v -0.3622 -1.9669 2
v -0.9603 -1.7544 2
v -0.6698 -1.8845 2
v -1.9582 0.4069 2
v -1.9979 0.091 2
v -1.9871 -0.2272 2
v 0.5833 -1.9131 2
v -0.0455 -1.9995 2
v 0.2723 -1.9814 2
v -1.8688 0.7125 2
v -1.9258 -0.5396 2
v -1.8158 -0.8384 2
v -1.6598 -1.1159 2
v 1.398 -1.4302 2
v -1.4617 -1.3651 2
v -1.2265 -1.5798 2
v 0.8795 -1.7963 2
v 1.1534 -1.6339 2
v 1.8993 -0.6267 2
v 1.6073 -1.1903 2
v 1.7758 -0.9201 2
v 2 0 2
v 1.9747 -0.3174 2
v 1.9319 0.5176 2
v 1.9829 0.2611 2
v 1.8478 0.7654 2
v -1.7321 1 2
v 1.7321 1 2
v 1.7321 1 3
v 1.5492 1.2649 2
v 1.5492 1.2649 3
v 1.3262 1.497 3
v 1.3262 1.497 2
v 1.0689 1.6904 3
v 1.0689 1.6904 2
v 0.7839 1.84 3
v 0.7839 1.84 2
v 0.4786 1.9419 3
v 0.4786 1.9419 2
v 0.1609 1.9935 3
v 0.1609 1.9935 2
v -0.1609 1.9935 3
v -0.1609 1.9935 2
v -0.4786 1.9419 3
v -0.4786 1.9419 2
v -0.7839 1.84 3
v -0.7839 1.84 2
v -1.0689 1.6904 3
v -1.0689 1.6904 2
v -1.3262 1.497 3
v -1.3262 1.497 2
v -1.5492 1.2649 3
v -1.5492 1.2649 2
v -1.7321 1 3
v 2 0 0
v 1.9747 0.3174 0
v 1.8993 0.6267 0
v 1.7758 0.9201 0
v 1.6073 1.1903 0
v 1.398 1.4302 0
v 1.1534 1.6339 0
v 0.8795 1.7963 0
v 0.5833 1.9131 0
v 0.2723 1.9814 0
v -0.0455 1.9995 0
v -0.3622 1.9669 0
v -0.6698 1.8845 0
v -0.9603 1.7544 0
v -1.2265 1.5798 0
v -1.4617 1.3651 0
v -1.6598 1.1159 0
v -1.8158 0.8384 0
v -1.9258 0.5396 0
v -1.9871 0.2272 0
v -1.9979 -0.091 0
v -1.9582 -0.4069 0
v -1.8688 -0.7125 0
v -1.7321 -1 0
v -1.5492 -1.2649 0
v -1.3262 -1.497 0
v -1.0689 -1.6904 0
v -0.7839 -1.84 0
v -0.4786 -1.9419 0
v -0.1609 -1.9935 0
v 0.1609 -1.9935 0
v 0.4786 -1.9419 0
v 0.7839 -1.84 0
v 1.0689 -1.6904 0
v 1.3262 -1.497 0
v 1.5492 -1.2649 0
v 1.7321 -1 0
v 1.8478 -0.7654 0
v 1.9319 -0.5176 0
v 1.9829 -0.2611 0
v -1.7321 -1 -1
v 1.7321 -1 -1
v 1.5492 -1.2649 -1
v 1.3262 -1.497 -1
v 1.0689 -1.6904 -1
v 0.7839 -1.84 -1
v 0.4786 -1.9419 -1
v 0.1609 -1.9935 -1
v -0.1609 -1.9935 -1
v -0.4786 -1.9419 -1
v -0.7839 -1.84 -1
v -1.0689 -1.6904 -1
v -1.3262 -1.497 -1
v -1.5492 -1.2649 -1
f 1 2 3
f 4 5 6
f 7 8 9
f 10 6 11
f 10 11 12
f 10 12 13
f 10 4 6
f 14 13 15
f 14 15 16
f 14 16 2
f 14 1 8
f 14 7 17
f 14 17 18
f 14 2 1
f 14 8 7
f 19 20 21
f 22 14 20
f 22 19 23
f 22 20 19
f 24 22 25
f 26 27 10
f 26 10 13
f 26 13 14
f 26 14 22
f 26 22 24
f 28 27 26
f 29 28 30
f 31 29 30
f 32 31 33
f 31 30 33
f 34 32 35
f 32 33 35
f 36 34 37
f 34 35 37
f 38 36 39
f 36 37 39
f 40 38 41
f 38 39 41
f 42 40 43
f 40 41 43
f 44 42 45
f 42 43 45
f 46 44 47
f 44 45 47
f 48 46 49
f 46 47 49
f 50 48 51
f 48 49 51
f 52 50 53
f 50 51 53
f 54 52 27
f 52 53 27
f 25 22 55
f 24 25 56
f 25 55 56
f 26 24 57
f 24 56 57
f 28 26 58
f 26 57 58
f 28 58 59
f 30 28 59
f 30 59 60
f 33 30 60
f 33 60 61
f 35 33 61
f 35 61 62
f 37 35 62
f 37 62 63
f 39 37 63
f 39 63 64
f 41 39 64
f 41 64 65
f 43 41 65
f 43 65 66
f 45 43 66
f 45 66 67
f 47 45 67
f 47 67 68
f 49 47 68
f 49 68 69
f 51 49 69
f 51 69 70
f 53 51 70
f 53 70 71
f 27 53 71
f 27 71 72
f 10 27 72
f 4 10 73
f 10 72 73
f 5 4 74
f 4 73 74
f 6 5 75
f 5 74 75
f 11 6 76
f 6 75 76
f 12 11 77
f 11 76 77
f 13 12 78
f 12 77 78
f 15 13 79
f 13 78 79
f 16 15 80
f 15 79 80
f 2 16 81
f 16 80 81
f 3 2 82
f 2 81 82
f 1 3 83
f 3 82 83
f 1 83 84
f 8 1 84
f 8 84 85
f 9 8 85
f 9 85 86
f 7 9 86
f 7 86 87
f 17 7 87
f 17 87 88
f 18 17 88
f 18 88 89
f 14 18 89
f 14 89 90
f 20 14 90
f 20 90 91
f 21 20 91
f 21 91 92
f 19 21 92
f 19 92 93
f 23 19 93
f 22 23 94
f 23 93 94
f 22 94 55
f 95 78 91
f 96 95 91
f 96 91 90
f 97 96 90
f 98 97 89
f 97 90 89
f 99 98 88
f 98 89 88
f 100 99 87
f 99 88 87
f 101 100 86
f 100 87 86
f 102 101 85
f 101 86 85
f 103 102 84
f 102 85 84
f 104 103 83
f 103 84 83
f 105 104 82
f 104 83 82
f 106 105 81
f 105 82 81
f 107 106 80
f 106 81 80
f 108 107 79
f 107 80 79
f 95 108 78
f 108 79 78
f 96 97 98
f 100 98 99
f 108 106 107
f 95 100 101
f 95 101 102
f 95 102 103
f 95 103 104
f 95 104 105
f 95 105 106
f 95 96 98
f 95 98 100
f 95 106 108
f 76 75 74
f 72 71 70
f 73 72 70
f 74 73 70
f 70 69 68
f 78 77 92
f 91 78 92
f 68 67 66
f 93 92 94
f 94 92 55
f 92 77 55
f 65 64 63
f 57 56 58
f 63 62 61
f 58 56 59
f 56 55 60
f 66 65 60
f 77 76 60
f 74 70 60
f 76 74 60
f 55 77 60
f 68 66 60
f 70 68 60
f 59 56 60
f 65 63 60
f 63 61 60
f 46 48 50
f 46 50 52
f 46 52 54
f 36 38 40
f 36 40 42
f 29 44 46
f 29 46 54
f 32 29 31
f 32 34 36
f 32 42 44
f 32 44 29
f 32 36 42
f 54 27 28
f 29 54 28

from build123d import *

# Parameters (mm, degrees)
SKETCH1_R           = 2
BOSS_EXTRUDE1_DEPTH = 2
BOSS_EXTRUDE2_DEPTH = 1
BOSS_EXTRUDE3_DEPTH = 1


with BuildPart() as part:
    # Sketch1 → Boss-Extrude1 (new body)
    with BuildSketch(Plane.XY):
        Circle(SKETCH1_R)
    extrude(amount=BOSS_EXTRUDE1_DEPTH)

    # Sketch2 → Boss-Extrude2 (add)
    with BuildSketch(Plane.XY.offset(2)):
        with BuildLine():
            Line((-1.732050808, 1), (1.732050808, 1))
            ThreePointArc((1.732050808, 1), (0, 2), (-1.732050808, 1))
        make_face()
    extrude(amount=BOSS_EXTRUDE2_DEPTH)

    # Sketch3 → Boss-Extrude3 (add)
    with BuildSketch(Plane(origin=(0, 0, 0), x_dir=(-1, 0, 0), z_dir=(0, 0, -1))):
        with BuildLine():
            Line((1.732050808, -1), (-1.732050808, -1))
            ThreePointArc((-1.732050808, -1), (0, -2), (1.732050808, -1))
        make_face()
    extrude(amount=BOSS_EXTRUDE3_DEPTH)


solid = part.part
